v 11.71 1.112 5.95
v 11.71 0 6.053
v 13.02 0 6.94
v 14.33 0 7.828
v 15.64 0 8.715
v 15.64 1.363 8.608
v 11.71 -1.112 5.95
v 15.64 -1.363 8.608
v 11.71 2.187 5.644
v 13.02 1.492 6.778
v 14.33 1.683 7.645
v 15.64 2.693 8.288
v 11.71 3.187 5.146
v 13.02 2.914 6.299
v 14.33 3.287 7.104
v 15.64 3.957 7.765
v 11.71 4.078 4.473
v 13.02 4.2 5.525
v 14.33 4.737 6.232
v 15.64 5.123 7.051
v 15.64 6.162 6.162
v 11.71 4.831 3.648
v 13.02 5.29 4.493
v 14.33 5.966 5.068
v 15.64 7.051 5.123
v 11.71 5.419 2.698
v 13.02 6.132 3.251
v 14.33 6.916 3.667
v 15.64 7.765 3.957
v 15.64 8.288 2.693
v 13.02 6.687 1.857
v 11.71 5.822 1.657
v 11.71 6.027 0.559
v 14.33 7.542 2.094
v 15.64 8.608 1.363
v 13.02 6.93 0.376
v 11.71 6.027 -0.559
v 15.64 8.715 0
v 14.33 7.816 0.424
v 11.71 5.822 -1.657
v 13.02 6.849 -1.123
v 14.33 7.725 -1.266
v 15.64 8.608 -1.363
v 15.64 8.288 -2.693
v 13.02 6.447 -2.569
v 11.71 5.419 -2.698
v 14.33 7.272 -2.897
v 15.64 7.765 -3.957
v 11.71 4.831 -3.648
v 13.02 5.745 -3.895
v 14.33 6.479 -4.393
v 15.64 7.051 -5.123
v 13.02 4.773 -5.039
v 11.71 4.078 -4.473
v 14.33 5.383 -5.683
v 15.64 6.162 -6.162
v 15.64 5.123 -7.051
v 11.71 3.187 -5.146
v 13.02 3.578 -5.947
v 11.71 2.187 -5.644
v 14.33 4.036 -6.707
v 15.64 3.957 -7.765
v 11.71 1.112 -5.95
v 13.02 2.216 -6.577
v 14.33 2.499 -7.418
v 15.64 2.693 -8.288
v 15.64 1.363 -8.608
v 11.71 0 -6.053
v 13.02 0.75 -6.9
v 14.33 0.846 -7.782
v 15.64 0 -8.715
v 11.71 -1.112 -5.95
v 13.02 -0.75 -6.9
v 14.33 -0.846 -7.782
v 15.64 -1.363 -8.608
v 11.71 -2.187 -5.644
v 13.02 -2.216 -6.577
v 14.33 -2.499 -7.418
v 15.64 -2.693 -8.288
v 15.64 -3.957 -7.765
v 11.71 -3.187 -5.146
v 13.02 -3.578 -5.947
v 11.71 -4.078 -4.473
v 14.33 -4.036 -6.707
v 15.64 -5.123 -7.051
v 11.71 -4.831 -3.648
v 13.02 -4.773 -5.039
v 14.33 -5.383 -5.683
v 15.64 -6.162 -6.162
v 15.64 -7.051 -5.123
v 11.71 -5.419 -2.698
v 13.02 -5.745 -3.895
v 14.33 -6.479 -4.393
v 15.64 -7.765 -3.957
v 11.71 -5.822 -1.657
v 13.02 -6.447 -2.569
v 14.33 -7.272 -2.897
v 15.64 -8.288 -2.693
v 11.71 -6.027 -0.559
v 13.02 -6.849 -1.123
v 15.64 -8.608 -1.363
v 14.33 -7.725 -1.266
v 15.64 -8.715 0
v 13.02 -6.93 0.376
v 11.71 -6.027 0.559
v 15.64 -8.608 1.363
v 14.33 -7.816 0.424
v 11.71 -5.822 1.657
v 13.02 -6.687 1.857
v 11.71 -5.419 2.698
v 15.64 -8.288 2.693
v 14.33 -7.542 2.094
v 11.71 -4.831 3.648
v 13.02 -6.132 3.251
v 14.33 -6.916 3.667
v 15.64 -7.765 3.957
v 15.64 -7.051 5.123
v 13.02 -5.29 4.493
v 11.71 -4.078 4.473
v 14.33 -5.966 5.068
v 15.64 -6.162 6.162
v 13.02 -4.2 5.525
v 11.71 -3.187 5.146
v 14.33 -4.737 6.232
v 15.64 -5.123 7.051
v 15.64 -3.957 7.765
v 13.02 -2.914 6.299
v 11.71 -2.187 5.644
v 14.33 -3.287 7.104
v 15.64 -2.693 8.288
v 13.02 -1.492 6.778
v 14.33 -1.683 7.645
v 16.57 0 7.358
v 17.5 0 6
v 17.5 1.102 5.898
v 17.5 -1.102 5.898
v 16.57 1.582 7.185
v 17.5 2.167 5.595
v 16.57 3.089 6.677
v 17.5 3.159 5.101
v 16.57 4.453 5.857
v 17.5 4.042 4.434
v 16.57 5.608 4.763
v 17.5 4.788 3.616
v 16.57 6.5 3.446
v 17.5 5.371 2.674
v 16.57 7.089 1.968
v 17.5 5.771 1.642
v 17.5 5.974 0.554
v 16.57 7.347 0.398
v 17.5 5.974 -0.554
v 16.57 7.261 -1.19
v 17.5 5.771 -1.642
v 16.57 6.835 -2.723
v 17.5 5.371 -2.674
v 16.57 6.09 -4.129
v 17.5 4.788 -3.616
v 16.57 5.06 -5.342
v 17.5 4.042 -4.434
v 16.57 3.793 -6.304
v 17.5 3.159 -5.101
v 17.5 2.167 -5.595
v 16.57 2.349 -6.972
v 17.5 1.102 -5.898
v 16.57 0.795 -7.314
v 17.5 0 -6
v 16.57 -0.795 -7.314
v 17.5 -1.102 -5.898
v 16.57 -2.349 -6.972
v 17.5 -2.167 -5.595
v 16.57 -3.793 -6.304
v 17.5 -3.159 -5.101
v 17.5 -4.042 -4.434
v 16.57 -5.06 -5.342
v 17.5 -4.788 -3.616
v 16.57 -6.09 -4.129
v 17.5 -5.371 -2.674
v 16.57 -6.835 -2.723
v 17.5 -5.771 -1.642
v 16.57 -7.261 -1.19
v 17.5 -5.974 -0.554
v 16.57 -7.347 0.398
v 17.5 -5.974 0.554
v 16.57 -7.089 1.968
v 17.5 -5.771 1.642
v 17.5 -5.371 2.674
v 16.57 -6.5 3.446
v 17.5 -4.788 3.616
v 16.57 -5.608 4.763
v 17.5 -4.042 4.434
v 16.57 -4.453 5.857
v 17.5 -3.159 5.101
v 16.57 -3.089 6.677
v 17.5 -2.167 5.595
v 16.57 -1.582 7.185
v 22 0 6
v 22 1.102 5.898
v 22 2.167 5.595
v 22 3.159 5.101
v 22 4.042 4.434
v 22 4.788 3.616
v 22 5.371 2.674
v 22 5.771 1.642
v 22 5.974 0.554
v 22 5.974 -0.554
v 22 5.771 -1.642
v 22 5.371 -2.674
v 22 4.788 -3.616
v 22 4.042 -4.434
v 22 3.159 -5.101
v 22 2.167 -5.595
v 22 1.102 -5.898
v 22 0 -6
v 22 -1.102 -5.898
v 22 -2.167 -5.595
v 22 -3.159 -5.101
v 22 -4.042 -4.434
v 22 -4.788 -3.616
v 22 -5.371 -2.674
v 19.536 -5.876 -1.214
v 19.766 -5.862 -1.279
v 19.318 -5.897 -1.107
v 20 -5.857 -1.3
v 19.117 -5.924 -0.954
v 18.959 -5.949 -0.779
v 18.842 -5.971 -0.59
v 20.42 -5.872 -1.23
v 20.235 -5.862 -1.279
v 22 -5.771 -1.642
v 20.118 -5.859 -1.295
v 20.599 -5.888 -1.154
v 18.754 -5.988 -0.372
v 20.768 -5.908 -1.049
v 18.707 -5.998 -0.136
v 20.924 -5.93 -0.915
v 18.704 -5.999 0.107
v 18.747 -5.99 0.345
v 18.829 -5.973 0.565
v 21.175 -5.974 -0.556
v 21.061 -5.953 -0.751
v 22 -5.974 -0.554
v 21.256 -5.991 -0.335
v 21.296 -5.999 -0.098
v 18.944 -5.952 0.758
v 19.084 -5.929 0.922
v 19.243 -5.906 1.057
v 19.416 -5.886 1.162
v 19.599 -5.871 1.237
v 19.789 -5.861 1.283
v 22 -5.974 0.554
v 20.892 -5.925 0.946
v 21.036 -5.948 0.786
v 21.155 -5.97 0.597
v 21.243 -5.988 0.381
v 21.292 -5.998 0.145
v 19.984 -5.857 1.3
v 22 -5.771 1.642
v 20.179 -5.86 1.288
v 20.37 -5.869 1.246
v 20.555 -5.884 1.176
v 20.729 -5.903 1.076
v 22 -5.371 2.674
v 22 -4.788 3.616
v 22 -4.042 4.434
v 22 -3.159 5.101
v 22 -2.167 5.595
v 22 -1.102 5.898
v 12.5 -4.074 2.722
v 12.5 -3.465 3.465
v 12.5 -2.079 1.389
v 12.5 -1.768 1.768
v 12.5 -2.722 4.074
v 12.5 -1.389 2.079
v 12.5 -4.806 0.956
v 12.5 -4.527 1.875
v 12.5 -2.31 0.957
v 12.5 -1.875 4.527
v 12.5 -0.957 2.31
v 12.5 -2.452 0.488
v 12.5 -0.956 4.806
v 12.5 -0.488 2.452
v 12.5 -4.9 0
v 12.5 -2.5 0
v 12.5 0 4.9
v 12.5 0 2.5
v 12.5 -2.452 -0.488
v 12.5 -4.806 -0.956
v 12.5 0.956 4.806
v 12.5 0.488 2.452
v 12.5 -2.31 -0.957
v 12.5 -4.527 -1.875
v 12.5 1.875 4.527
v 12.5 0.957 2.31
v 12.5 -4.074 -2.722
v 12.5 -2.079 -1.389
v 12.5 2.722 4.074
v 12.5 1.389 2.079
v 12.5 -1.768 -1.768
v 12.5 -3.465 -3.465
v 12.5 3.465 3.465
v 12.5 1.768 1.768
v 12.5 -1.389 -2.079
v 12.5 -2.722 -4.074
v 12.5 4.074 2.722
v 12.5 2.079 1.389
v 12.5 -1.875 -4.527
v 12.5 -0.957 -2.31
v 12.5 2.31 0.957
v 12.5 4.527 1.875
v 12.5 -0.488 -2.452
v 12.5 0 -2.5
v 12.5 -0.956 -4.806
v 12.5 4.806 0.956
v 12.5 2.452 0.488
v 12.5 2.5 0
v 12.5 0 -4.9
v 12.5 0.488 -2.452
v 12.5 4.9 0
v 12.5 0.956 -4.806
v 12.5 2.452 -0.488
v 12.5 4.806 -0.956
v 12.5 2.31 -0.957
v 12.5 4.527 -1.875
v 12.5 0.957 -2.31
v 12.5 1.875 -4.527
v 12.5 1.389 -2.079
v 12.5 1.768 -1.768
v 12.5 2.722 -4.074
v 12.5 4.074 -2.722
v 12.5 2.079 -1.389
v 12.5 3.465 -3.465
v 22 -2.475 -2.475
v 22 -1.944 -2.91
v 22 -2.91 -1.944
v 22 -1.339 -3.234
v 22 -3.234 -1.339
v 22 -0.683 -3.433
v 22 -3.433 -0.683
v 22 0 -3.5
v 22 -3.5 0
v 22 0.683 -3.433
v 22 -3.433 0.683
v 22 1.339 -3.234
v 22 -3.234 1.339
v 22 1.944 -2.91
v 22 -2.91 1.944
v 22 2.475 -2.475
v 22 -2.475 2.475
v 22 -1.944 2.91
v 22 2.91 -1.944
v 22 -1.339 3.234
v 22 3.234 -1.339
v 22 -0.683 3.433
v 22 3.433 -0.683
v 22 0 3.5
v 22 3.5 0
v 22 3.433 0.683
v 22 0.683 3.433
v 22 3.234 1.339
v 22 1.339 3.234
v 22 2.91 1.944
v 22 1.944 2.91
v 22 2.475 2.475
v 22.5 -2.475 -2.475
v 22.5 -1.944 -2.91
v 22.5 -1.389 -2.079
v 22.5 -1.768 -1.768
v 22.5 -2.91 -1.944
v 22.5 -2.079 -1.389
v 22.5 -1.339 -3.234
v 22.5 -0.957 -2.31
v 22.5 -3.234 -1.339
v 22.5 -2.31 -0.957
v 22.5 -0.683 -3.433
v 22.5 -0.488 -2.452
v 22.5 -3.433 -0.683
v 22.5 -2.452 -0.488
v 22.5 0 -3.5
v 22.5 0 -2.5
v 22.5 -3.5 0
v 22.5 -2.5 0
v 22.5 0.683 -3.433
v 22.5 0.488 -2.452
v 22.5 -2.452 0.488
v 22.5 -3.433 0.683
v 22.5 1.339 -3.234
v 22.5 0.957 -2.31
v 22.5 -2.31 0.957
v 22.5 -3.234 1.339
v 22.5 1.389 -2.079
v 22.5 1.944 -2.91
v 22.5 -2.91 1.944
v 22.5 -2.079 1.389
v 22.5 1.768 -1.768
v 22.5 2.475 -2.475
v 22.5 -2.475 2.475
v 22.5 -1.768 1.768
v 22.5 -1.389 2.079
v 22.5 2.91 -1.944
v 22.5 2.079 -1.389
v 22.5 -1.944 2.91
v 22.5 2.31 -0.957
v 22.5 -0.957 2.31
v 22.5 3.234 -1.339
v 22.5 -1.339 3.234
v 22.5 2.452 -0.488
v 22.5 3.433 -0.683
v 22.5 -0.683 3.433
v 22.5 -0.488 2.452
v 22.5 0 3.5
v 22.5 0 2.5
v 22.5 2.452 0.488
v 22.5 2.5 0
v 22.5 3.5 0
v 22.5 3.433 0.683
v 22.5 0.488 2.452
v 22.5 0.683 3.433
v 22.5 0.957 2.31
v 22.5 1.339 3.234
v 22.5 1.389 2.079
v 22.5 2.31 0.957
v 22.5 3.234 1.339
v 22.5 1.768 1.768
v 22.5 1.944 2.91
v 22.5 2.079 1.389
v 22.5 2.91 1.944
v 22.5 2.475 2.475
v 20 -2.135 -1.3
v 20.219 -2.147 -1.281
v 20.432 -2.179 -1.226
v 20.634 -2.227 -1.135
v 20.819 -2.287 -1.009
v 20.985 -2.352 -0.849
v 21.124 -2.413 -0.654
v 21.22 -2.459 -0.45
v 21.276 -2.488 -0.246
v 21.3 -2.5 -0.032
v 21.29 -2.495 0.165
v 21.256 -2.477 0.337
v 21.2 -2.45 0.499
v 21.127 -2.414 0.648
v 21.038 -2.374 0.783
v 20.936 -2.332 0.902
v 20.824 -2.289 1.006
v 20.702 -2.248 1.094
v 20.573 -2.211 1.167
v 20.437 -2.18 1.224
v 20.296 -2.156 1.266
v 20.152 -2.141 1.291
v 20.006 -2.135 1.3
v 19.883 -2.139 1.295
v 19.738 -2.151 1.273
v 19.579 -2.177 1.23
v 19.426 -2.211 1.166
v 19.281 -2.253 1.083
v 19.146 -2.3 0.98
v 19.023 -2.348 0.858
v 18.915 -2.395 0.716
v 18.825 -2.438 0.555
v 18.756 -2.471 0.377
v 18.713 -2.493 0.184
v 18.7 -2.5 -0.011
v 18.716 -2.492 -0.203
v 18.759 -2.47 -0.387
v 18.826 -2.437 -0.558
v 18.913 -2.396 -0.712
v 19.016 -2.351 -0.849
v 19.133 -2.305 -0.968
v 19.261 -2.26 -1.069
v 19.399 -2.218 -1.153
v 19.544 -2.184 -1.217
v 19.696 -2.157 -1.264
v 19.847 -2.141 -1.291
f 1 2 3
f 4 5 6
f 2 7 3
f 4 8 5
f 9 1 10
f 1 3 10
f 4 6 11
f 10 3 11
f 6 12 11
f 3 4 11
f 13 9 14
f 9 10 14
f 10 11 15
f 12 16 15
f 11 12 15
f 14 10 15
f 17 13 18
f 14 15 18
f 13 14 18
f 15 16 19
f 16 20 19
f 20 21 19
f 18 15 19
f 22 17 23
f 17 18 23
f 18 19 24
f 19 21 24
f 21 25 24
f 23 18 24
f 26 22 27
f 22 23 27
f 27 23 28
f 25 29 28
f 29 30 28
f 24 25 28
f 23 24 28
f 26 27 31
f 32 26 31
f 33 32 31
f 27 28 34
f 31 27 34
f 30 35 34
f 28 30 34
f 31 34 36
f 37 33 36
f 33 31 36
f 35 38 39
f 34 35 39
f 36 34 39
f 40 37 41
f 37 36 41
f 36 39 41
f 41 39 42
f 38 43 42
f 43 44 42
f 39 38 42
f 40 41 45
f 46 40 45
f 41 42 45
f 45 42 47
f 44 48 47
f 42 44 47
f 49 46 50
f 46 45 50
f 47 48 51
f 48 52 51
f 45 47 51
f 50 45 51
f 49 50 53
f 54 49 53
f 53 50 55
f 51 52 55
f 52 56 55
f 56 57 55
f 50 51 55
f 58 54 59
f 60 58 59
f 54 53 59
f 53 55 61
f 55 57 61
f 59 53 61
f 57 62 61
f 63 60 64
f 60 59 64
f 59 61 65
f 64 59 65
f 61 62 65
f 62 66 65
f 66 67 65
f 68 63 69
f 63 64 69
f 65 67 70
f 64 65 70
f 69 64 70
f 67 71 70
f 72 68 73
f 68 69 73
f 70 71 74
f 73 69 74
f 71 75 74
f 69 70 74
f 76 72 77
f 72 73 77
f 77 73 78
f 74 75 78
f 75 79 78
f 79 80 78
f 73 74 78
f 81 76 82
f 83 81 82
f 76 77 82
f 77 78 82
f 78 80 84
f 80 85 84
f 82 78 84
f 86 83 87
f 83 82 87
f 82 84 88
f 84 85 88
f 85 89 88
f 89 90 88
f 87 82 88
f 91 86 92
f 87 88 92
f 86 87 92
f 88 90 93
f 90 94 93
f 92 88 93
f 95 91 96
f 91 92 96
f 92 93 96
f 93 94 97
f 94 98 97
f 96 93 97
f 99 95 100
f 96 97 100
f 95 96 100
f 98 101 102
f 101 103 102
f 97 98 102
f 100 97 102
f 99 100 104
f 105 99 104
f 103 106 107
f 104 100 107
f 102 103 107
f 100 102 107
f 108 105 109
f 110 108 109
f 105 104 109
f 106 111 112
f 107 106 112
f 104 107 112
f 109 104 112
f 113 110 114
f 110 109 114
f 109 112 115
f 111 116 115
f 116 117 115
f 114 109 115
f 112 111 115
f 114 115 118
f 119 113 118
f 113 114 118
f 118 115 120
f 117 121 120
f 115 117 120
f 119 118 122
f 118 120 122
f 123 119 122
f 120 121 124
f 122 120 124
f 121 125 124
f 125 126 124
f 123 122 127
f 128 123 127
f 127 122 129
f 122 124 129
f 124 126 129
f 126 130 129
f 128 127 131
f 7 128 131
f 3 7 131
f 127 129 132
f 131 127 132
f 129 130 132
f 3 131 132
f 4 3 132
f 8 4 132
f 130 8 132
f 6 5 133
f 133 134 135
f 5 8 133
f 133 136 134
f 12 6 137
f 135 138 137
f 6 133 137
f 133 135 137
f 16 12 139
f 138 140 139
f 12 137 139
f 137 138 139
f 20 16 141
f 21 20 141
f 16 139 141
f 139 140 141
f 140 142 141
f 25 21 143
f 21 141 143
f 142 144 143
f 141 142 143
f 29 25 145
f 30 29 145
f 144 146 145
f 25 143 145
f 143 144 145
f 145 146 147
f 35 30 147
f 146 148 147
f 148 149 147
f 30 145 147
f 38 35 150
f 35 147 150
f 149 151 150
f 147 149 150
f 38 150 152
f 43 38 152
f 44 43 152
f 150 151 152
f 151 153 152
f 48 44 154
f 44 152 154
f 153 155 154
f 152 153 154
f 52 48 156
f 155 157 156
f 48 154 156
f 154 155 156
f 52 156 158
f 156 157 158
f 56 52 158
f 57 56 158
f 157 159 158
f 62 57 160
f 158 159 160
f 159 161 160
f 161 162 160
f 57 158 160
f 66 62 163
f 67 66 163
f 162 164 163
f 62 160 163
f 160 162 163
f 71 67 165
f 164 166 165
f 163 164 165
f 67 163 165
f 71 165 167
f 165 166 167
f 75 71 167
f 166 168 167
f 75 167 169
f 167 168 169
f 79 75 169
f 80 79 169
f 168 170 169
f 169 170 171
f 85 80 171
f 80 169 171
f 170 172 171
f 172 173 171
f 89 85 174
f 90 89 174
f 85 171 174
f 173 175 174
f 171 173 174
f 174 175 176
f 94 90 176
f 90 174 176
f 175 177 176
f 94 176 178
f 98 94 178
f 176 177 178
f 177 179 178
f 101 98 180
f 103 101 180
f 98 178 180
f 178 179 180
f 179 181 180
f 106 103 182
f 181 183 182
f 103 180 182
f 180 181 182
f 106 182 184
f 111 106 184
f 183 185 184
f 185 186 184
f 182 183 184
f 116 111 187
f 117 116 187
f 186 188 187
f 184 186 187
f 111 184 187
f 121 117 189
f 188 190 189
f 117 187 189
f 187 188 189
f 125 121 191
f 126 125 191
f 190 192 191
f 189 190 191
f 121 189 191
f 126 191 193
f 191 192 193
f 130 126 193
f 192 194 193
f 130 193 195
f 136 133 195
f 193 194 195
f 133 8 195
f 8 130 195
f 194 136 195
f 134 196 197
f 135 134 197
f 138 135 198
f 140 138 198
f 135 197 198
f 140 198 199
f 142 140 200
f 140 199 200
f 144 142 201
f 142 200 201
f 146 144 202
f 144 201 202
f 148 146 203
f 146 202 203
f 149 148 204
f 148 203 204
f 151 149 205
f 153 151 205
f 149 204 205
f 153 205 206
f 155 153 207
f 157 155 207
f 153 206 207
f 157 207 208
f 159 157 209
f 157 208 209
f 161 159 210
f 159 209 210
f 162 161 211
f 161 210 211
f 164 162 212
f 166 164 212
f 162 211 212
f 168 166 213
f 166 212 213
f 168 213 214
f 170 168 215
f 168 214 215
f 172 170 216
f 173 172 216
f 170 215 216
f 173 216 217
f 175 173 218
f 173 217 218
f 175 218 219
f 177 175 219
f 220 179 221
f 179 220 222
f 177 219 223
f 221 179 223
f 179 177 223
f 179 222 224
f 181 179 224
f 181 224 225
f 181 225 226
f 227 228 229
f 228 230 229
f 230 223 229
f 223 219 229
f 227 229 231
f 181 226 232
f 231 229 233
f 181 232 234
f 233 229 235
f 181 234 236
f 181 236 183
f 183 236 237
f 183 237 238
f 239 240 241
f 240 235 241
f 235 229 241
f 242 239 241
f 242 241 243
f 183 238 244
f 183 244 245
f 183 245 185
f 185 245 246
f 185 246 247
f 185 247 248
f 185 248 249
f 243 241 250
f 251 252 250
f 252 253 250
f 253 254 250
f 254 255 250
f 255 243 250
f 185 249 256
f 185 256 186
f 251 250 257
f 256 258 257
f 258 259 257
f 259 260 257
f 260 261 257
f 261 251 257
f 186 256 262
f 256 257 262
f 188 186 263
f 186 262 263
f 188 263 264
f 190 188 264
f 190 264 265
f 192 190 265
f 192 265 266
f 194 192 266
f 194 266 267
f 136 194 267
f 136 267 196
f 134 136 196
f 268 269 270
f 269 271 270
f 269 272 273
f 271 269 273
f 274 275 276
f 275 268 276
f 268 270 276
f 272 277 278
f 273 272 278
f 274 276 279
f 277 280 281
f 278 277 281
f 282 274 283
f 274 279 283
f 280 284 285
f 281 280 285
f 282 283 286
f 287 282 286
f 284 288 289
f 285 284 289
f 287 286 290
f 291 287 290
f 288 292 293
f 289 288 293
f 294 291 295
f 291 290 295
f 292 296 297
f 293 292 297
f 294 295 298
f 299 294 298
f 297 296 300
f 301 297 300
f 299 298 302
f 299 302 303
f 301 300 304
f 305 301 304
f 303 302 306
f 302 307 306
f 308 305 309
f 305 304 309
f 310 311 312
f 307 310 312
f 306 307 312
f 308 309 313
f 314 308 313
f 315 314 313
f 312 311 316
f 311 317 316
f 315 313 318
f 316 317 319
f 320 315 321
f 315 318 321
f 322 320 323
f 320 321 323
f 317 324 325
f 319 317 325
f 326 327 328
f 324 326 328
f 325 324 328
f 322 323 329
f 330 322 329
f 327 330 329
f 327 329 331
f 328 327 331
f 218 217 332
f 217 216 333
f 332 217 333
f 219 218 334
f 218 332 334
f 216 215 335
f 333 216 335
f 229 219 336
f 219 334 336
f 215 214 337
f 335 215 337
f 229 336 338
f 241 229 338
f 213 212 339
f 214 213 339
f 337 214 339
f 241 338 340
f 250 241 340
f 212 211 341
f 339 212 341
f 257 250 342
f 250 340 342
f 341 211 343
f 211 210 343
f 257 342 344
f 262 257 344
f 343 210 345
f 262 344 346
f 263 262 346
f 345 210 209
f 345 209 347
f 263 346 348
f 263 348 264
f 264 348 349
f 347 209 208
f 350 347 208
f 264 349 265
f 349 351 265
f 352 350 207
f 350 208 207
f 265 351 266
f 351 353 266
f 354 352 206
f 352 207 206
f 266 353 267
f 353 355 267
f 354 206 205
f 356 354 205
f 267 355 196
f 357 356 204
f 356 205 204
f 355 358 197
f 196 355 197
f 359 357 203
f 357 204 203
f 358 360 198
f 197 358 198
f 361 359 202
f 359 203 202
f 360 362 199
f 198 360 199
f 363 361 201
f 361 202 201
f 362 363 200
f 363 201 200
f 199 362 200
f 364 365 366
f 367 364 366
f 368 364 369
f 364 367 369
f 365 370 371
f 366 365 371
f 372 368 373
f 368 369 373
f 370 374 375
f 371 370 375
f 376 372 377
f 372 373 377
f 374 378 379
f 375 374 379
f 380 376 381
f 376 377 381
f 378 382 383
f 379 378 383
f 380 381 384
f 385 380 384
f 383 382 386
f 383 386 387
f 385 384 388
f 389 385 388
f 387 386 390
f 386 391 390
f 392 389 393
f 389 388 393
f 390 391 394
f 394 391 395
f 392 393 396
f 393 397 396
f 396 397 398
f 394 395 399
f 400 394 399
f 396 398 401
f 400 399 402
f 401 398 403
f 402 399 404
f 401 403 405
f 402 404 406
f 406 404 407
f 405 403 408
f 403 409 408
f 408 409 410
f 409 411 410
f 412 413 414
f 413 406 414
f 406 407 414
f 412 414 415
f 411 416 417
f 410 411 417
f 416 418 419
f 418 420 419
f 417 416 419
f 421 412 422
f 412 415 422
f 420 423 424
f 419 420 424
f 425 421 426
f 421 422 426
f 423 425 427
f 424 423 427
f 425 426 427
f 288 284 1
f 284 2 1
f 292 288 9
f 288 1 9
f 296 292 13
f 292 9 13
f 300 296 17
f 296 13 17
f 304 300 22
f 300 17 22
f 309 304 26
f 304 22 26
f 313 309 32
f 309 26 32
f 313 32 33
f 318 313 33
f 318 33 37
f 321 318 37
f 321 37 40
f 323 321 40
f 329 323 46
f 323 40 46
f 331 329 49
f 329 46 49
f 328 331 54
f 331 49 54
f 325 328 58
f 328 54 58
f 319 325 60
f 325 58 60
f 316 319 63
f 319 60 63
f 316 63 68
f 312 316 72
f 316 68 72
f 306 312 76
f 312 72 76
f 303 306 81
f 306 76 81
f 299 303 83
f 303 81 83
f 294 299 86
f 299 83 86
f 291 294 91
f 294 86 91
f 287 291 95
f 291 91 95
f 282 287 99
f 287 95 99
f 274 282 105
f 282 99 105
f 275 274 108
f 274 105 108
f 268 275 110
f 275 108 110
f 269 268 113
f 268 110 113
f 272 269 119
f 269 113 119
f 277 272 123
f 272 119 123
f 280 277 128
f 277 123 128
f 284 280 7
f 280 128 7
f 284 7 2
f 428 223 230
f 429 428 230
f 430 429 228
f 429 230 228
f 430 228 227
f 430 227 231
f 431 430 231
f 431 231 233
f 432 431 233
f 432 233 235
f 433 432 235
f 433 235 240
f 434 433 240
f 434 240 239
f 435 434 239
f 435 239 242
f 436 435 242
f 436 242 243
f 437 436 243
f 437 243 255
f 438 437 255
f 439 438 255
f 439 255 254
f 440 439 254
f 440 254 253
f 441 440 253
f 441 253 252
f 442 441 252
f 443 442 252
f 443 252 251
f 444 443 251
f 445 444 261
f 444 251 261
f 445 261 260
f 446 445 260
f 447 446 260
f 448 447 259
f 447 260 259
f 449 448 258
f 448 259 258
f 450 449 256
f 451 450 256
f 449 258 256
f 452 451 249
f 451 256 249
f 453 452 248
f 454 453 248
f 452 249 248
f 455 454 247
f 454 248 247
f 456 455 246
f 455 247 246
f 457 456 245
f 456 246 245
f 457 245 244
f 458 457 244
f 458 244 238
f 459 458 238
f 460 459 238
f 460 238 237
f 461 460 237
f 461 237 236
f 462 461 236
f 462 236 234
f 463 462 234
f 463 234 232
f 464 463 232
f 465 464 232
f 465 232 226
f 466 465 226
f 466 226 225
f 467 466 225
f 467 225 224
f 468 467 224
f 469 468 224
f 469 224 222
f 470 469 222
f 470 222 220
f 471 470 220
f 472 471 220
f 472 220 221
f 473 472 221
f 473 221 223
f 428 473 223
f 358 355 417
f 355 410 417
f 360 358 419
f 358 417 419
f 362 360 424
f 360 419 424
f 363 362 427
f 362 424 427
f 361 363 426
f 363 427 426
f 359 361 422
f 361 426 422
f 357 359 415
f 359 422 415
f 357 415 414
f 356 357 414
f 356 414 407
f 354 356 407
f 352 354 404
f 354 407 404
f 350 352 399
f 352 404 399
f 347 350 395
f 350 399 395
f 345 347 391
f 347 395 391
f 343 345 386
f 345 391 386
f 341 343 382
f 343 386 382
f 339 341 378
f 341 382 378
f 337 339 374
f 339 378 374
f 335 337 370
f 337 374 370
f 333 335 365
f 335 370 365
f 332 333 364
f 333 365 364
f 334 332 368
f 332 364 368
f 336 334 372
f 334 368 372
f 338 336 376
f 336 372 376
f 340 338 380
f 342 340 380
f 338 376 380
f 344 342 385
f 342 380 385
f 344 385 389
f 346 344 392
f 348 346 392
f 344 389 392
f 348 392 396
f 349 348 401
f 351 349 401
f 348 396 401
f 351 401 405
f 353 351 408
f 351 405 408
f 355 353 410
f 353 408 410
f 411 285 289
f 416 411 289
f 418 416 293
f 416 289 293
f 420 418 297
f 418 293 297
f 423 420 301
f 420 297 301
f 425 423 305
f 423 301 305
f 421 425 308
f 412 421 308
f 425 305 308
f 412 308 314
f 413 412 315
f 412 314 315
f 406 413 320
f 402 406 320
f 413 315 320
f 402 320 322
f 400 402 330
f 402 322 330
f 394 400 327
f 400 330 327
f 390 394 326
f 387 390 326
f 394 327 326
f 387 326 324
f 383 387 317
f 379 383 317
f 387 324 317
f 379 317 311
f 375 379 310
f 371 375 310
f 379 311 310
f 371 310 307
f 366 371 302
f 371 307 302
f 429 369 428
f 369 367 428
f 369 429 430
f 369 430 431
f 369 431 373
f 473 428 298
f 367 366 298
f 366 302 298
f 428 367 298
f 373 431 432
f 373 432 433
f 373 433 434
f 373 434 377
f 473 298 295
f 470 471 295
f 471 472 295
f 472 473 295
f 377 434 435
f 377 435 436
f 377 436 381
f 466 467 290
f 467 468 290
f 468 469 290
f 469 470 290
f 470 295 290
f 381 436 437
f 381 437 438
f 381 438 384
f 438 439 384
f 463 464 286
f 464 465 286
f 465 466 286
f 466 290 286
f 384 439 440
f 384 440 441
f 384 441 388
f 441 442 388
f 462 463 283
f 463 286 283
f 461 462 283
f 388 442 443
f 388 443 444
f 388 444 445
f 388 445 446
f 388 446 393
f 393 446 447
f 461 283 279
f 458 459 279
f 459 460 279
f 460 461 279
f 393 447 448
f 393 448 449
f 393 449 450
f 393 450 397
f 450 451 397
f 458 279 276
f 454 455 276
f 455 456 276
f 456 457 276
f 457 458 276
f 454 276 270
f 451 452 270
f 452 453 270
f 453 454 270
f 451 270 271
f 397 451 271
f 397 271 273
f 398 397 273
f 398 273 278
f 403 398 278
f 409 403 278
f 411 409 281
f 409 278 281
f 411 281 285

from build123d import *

# Parameters (mm, degrees)
TAP_DRILL_FOR_M3X0_5_TAP1_REACH  = 21.005
TAP_DRILL_FOR_M3X0_5_TAP1_BORE_R = 1.3


with BuildPart() as part:
    # Sketch1 → Revolve1 (revolve)
    with BuildSketch(Plane(origin=(0, 0, 0), x_dir=(-1, 0, 0), z_dir=(0, 0, -1)), mode=Mode.PRIVATE) as revolve1_sk:
        Polygon((-22.5, 3.5), (-22.5, 2.5), (-12.5, 2.5), (-12.5, 4.9), (-11.71, 6.053145161), (-15.64, 8.715), (-17.5, 6), (-22, 6), (-22, 3.5), align=None)
    revolve(revolve1_sk.sketch.rotate(Axis((22.5, 0, 0), (-1, 0, 0)), 270), axis=Axis((22.5, 0, 0), (-1, 0, 0)))

    # Tap Drill for M3x0.5 Tap1 bore (on position points) → Tap Drill for M3x0.5 Tap1 (cut, up to next)
    with BuildSketch(Plane(origin=(20, -6, 0), x_dir=(0, 0, -1), z_dir=(0, -1, 0)), mode=Mode.PRIVATE) as tap_drill_for_m3x0_5_tap1_sk1:
        Circle(TAP_DRILL_FOR_M3X0_5_TAP1_BORE_R)
    tap_drill_for_m3x0_5_tap1_tool1 = extrude(tap_drill_for_m3x0_5_tap1_sk1.sketch, amount=-TAP_DRILL_FOR_M3X0_5_TAP1_REACH, mode=Mode.PRIVATE) & part.part
    add(tap_drill_for_m3x0_5_tap1_tool1.solids().sort_by_distance((20, -6, 0))[0], mode=Mode.SUBTRACT)


solid = part.part
